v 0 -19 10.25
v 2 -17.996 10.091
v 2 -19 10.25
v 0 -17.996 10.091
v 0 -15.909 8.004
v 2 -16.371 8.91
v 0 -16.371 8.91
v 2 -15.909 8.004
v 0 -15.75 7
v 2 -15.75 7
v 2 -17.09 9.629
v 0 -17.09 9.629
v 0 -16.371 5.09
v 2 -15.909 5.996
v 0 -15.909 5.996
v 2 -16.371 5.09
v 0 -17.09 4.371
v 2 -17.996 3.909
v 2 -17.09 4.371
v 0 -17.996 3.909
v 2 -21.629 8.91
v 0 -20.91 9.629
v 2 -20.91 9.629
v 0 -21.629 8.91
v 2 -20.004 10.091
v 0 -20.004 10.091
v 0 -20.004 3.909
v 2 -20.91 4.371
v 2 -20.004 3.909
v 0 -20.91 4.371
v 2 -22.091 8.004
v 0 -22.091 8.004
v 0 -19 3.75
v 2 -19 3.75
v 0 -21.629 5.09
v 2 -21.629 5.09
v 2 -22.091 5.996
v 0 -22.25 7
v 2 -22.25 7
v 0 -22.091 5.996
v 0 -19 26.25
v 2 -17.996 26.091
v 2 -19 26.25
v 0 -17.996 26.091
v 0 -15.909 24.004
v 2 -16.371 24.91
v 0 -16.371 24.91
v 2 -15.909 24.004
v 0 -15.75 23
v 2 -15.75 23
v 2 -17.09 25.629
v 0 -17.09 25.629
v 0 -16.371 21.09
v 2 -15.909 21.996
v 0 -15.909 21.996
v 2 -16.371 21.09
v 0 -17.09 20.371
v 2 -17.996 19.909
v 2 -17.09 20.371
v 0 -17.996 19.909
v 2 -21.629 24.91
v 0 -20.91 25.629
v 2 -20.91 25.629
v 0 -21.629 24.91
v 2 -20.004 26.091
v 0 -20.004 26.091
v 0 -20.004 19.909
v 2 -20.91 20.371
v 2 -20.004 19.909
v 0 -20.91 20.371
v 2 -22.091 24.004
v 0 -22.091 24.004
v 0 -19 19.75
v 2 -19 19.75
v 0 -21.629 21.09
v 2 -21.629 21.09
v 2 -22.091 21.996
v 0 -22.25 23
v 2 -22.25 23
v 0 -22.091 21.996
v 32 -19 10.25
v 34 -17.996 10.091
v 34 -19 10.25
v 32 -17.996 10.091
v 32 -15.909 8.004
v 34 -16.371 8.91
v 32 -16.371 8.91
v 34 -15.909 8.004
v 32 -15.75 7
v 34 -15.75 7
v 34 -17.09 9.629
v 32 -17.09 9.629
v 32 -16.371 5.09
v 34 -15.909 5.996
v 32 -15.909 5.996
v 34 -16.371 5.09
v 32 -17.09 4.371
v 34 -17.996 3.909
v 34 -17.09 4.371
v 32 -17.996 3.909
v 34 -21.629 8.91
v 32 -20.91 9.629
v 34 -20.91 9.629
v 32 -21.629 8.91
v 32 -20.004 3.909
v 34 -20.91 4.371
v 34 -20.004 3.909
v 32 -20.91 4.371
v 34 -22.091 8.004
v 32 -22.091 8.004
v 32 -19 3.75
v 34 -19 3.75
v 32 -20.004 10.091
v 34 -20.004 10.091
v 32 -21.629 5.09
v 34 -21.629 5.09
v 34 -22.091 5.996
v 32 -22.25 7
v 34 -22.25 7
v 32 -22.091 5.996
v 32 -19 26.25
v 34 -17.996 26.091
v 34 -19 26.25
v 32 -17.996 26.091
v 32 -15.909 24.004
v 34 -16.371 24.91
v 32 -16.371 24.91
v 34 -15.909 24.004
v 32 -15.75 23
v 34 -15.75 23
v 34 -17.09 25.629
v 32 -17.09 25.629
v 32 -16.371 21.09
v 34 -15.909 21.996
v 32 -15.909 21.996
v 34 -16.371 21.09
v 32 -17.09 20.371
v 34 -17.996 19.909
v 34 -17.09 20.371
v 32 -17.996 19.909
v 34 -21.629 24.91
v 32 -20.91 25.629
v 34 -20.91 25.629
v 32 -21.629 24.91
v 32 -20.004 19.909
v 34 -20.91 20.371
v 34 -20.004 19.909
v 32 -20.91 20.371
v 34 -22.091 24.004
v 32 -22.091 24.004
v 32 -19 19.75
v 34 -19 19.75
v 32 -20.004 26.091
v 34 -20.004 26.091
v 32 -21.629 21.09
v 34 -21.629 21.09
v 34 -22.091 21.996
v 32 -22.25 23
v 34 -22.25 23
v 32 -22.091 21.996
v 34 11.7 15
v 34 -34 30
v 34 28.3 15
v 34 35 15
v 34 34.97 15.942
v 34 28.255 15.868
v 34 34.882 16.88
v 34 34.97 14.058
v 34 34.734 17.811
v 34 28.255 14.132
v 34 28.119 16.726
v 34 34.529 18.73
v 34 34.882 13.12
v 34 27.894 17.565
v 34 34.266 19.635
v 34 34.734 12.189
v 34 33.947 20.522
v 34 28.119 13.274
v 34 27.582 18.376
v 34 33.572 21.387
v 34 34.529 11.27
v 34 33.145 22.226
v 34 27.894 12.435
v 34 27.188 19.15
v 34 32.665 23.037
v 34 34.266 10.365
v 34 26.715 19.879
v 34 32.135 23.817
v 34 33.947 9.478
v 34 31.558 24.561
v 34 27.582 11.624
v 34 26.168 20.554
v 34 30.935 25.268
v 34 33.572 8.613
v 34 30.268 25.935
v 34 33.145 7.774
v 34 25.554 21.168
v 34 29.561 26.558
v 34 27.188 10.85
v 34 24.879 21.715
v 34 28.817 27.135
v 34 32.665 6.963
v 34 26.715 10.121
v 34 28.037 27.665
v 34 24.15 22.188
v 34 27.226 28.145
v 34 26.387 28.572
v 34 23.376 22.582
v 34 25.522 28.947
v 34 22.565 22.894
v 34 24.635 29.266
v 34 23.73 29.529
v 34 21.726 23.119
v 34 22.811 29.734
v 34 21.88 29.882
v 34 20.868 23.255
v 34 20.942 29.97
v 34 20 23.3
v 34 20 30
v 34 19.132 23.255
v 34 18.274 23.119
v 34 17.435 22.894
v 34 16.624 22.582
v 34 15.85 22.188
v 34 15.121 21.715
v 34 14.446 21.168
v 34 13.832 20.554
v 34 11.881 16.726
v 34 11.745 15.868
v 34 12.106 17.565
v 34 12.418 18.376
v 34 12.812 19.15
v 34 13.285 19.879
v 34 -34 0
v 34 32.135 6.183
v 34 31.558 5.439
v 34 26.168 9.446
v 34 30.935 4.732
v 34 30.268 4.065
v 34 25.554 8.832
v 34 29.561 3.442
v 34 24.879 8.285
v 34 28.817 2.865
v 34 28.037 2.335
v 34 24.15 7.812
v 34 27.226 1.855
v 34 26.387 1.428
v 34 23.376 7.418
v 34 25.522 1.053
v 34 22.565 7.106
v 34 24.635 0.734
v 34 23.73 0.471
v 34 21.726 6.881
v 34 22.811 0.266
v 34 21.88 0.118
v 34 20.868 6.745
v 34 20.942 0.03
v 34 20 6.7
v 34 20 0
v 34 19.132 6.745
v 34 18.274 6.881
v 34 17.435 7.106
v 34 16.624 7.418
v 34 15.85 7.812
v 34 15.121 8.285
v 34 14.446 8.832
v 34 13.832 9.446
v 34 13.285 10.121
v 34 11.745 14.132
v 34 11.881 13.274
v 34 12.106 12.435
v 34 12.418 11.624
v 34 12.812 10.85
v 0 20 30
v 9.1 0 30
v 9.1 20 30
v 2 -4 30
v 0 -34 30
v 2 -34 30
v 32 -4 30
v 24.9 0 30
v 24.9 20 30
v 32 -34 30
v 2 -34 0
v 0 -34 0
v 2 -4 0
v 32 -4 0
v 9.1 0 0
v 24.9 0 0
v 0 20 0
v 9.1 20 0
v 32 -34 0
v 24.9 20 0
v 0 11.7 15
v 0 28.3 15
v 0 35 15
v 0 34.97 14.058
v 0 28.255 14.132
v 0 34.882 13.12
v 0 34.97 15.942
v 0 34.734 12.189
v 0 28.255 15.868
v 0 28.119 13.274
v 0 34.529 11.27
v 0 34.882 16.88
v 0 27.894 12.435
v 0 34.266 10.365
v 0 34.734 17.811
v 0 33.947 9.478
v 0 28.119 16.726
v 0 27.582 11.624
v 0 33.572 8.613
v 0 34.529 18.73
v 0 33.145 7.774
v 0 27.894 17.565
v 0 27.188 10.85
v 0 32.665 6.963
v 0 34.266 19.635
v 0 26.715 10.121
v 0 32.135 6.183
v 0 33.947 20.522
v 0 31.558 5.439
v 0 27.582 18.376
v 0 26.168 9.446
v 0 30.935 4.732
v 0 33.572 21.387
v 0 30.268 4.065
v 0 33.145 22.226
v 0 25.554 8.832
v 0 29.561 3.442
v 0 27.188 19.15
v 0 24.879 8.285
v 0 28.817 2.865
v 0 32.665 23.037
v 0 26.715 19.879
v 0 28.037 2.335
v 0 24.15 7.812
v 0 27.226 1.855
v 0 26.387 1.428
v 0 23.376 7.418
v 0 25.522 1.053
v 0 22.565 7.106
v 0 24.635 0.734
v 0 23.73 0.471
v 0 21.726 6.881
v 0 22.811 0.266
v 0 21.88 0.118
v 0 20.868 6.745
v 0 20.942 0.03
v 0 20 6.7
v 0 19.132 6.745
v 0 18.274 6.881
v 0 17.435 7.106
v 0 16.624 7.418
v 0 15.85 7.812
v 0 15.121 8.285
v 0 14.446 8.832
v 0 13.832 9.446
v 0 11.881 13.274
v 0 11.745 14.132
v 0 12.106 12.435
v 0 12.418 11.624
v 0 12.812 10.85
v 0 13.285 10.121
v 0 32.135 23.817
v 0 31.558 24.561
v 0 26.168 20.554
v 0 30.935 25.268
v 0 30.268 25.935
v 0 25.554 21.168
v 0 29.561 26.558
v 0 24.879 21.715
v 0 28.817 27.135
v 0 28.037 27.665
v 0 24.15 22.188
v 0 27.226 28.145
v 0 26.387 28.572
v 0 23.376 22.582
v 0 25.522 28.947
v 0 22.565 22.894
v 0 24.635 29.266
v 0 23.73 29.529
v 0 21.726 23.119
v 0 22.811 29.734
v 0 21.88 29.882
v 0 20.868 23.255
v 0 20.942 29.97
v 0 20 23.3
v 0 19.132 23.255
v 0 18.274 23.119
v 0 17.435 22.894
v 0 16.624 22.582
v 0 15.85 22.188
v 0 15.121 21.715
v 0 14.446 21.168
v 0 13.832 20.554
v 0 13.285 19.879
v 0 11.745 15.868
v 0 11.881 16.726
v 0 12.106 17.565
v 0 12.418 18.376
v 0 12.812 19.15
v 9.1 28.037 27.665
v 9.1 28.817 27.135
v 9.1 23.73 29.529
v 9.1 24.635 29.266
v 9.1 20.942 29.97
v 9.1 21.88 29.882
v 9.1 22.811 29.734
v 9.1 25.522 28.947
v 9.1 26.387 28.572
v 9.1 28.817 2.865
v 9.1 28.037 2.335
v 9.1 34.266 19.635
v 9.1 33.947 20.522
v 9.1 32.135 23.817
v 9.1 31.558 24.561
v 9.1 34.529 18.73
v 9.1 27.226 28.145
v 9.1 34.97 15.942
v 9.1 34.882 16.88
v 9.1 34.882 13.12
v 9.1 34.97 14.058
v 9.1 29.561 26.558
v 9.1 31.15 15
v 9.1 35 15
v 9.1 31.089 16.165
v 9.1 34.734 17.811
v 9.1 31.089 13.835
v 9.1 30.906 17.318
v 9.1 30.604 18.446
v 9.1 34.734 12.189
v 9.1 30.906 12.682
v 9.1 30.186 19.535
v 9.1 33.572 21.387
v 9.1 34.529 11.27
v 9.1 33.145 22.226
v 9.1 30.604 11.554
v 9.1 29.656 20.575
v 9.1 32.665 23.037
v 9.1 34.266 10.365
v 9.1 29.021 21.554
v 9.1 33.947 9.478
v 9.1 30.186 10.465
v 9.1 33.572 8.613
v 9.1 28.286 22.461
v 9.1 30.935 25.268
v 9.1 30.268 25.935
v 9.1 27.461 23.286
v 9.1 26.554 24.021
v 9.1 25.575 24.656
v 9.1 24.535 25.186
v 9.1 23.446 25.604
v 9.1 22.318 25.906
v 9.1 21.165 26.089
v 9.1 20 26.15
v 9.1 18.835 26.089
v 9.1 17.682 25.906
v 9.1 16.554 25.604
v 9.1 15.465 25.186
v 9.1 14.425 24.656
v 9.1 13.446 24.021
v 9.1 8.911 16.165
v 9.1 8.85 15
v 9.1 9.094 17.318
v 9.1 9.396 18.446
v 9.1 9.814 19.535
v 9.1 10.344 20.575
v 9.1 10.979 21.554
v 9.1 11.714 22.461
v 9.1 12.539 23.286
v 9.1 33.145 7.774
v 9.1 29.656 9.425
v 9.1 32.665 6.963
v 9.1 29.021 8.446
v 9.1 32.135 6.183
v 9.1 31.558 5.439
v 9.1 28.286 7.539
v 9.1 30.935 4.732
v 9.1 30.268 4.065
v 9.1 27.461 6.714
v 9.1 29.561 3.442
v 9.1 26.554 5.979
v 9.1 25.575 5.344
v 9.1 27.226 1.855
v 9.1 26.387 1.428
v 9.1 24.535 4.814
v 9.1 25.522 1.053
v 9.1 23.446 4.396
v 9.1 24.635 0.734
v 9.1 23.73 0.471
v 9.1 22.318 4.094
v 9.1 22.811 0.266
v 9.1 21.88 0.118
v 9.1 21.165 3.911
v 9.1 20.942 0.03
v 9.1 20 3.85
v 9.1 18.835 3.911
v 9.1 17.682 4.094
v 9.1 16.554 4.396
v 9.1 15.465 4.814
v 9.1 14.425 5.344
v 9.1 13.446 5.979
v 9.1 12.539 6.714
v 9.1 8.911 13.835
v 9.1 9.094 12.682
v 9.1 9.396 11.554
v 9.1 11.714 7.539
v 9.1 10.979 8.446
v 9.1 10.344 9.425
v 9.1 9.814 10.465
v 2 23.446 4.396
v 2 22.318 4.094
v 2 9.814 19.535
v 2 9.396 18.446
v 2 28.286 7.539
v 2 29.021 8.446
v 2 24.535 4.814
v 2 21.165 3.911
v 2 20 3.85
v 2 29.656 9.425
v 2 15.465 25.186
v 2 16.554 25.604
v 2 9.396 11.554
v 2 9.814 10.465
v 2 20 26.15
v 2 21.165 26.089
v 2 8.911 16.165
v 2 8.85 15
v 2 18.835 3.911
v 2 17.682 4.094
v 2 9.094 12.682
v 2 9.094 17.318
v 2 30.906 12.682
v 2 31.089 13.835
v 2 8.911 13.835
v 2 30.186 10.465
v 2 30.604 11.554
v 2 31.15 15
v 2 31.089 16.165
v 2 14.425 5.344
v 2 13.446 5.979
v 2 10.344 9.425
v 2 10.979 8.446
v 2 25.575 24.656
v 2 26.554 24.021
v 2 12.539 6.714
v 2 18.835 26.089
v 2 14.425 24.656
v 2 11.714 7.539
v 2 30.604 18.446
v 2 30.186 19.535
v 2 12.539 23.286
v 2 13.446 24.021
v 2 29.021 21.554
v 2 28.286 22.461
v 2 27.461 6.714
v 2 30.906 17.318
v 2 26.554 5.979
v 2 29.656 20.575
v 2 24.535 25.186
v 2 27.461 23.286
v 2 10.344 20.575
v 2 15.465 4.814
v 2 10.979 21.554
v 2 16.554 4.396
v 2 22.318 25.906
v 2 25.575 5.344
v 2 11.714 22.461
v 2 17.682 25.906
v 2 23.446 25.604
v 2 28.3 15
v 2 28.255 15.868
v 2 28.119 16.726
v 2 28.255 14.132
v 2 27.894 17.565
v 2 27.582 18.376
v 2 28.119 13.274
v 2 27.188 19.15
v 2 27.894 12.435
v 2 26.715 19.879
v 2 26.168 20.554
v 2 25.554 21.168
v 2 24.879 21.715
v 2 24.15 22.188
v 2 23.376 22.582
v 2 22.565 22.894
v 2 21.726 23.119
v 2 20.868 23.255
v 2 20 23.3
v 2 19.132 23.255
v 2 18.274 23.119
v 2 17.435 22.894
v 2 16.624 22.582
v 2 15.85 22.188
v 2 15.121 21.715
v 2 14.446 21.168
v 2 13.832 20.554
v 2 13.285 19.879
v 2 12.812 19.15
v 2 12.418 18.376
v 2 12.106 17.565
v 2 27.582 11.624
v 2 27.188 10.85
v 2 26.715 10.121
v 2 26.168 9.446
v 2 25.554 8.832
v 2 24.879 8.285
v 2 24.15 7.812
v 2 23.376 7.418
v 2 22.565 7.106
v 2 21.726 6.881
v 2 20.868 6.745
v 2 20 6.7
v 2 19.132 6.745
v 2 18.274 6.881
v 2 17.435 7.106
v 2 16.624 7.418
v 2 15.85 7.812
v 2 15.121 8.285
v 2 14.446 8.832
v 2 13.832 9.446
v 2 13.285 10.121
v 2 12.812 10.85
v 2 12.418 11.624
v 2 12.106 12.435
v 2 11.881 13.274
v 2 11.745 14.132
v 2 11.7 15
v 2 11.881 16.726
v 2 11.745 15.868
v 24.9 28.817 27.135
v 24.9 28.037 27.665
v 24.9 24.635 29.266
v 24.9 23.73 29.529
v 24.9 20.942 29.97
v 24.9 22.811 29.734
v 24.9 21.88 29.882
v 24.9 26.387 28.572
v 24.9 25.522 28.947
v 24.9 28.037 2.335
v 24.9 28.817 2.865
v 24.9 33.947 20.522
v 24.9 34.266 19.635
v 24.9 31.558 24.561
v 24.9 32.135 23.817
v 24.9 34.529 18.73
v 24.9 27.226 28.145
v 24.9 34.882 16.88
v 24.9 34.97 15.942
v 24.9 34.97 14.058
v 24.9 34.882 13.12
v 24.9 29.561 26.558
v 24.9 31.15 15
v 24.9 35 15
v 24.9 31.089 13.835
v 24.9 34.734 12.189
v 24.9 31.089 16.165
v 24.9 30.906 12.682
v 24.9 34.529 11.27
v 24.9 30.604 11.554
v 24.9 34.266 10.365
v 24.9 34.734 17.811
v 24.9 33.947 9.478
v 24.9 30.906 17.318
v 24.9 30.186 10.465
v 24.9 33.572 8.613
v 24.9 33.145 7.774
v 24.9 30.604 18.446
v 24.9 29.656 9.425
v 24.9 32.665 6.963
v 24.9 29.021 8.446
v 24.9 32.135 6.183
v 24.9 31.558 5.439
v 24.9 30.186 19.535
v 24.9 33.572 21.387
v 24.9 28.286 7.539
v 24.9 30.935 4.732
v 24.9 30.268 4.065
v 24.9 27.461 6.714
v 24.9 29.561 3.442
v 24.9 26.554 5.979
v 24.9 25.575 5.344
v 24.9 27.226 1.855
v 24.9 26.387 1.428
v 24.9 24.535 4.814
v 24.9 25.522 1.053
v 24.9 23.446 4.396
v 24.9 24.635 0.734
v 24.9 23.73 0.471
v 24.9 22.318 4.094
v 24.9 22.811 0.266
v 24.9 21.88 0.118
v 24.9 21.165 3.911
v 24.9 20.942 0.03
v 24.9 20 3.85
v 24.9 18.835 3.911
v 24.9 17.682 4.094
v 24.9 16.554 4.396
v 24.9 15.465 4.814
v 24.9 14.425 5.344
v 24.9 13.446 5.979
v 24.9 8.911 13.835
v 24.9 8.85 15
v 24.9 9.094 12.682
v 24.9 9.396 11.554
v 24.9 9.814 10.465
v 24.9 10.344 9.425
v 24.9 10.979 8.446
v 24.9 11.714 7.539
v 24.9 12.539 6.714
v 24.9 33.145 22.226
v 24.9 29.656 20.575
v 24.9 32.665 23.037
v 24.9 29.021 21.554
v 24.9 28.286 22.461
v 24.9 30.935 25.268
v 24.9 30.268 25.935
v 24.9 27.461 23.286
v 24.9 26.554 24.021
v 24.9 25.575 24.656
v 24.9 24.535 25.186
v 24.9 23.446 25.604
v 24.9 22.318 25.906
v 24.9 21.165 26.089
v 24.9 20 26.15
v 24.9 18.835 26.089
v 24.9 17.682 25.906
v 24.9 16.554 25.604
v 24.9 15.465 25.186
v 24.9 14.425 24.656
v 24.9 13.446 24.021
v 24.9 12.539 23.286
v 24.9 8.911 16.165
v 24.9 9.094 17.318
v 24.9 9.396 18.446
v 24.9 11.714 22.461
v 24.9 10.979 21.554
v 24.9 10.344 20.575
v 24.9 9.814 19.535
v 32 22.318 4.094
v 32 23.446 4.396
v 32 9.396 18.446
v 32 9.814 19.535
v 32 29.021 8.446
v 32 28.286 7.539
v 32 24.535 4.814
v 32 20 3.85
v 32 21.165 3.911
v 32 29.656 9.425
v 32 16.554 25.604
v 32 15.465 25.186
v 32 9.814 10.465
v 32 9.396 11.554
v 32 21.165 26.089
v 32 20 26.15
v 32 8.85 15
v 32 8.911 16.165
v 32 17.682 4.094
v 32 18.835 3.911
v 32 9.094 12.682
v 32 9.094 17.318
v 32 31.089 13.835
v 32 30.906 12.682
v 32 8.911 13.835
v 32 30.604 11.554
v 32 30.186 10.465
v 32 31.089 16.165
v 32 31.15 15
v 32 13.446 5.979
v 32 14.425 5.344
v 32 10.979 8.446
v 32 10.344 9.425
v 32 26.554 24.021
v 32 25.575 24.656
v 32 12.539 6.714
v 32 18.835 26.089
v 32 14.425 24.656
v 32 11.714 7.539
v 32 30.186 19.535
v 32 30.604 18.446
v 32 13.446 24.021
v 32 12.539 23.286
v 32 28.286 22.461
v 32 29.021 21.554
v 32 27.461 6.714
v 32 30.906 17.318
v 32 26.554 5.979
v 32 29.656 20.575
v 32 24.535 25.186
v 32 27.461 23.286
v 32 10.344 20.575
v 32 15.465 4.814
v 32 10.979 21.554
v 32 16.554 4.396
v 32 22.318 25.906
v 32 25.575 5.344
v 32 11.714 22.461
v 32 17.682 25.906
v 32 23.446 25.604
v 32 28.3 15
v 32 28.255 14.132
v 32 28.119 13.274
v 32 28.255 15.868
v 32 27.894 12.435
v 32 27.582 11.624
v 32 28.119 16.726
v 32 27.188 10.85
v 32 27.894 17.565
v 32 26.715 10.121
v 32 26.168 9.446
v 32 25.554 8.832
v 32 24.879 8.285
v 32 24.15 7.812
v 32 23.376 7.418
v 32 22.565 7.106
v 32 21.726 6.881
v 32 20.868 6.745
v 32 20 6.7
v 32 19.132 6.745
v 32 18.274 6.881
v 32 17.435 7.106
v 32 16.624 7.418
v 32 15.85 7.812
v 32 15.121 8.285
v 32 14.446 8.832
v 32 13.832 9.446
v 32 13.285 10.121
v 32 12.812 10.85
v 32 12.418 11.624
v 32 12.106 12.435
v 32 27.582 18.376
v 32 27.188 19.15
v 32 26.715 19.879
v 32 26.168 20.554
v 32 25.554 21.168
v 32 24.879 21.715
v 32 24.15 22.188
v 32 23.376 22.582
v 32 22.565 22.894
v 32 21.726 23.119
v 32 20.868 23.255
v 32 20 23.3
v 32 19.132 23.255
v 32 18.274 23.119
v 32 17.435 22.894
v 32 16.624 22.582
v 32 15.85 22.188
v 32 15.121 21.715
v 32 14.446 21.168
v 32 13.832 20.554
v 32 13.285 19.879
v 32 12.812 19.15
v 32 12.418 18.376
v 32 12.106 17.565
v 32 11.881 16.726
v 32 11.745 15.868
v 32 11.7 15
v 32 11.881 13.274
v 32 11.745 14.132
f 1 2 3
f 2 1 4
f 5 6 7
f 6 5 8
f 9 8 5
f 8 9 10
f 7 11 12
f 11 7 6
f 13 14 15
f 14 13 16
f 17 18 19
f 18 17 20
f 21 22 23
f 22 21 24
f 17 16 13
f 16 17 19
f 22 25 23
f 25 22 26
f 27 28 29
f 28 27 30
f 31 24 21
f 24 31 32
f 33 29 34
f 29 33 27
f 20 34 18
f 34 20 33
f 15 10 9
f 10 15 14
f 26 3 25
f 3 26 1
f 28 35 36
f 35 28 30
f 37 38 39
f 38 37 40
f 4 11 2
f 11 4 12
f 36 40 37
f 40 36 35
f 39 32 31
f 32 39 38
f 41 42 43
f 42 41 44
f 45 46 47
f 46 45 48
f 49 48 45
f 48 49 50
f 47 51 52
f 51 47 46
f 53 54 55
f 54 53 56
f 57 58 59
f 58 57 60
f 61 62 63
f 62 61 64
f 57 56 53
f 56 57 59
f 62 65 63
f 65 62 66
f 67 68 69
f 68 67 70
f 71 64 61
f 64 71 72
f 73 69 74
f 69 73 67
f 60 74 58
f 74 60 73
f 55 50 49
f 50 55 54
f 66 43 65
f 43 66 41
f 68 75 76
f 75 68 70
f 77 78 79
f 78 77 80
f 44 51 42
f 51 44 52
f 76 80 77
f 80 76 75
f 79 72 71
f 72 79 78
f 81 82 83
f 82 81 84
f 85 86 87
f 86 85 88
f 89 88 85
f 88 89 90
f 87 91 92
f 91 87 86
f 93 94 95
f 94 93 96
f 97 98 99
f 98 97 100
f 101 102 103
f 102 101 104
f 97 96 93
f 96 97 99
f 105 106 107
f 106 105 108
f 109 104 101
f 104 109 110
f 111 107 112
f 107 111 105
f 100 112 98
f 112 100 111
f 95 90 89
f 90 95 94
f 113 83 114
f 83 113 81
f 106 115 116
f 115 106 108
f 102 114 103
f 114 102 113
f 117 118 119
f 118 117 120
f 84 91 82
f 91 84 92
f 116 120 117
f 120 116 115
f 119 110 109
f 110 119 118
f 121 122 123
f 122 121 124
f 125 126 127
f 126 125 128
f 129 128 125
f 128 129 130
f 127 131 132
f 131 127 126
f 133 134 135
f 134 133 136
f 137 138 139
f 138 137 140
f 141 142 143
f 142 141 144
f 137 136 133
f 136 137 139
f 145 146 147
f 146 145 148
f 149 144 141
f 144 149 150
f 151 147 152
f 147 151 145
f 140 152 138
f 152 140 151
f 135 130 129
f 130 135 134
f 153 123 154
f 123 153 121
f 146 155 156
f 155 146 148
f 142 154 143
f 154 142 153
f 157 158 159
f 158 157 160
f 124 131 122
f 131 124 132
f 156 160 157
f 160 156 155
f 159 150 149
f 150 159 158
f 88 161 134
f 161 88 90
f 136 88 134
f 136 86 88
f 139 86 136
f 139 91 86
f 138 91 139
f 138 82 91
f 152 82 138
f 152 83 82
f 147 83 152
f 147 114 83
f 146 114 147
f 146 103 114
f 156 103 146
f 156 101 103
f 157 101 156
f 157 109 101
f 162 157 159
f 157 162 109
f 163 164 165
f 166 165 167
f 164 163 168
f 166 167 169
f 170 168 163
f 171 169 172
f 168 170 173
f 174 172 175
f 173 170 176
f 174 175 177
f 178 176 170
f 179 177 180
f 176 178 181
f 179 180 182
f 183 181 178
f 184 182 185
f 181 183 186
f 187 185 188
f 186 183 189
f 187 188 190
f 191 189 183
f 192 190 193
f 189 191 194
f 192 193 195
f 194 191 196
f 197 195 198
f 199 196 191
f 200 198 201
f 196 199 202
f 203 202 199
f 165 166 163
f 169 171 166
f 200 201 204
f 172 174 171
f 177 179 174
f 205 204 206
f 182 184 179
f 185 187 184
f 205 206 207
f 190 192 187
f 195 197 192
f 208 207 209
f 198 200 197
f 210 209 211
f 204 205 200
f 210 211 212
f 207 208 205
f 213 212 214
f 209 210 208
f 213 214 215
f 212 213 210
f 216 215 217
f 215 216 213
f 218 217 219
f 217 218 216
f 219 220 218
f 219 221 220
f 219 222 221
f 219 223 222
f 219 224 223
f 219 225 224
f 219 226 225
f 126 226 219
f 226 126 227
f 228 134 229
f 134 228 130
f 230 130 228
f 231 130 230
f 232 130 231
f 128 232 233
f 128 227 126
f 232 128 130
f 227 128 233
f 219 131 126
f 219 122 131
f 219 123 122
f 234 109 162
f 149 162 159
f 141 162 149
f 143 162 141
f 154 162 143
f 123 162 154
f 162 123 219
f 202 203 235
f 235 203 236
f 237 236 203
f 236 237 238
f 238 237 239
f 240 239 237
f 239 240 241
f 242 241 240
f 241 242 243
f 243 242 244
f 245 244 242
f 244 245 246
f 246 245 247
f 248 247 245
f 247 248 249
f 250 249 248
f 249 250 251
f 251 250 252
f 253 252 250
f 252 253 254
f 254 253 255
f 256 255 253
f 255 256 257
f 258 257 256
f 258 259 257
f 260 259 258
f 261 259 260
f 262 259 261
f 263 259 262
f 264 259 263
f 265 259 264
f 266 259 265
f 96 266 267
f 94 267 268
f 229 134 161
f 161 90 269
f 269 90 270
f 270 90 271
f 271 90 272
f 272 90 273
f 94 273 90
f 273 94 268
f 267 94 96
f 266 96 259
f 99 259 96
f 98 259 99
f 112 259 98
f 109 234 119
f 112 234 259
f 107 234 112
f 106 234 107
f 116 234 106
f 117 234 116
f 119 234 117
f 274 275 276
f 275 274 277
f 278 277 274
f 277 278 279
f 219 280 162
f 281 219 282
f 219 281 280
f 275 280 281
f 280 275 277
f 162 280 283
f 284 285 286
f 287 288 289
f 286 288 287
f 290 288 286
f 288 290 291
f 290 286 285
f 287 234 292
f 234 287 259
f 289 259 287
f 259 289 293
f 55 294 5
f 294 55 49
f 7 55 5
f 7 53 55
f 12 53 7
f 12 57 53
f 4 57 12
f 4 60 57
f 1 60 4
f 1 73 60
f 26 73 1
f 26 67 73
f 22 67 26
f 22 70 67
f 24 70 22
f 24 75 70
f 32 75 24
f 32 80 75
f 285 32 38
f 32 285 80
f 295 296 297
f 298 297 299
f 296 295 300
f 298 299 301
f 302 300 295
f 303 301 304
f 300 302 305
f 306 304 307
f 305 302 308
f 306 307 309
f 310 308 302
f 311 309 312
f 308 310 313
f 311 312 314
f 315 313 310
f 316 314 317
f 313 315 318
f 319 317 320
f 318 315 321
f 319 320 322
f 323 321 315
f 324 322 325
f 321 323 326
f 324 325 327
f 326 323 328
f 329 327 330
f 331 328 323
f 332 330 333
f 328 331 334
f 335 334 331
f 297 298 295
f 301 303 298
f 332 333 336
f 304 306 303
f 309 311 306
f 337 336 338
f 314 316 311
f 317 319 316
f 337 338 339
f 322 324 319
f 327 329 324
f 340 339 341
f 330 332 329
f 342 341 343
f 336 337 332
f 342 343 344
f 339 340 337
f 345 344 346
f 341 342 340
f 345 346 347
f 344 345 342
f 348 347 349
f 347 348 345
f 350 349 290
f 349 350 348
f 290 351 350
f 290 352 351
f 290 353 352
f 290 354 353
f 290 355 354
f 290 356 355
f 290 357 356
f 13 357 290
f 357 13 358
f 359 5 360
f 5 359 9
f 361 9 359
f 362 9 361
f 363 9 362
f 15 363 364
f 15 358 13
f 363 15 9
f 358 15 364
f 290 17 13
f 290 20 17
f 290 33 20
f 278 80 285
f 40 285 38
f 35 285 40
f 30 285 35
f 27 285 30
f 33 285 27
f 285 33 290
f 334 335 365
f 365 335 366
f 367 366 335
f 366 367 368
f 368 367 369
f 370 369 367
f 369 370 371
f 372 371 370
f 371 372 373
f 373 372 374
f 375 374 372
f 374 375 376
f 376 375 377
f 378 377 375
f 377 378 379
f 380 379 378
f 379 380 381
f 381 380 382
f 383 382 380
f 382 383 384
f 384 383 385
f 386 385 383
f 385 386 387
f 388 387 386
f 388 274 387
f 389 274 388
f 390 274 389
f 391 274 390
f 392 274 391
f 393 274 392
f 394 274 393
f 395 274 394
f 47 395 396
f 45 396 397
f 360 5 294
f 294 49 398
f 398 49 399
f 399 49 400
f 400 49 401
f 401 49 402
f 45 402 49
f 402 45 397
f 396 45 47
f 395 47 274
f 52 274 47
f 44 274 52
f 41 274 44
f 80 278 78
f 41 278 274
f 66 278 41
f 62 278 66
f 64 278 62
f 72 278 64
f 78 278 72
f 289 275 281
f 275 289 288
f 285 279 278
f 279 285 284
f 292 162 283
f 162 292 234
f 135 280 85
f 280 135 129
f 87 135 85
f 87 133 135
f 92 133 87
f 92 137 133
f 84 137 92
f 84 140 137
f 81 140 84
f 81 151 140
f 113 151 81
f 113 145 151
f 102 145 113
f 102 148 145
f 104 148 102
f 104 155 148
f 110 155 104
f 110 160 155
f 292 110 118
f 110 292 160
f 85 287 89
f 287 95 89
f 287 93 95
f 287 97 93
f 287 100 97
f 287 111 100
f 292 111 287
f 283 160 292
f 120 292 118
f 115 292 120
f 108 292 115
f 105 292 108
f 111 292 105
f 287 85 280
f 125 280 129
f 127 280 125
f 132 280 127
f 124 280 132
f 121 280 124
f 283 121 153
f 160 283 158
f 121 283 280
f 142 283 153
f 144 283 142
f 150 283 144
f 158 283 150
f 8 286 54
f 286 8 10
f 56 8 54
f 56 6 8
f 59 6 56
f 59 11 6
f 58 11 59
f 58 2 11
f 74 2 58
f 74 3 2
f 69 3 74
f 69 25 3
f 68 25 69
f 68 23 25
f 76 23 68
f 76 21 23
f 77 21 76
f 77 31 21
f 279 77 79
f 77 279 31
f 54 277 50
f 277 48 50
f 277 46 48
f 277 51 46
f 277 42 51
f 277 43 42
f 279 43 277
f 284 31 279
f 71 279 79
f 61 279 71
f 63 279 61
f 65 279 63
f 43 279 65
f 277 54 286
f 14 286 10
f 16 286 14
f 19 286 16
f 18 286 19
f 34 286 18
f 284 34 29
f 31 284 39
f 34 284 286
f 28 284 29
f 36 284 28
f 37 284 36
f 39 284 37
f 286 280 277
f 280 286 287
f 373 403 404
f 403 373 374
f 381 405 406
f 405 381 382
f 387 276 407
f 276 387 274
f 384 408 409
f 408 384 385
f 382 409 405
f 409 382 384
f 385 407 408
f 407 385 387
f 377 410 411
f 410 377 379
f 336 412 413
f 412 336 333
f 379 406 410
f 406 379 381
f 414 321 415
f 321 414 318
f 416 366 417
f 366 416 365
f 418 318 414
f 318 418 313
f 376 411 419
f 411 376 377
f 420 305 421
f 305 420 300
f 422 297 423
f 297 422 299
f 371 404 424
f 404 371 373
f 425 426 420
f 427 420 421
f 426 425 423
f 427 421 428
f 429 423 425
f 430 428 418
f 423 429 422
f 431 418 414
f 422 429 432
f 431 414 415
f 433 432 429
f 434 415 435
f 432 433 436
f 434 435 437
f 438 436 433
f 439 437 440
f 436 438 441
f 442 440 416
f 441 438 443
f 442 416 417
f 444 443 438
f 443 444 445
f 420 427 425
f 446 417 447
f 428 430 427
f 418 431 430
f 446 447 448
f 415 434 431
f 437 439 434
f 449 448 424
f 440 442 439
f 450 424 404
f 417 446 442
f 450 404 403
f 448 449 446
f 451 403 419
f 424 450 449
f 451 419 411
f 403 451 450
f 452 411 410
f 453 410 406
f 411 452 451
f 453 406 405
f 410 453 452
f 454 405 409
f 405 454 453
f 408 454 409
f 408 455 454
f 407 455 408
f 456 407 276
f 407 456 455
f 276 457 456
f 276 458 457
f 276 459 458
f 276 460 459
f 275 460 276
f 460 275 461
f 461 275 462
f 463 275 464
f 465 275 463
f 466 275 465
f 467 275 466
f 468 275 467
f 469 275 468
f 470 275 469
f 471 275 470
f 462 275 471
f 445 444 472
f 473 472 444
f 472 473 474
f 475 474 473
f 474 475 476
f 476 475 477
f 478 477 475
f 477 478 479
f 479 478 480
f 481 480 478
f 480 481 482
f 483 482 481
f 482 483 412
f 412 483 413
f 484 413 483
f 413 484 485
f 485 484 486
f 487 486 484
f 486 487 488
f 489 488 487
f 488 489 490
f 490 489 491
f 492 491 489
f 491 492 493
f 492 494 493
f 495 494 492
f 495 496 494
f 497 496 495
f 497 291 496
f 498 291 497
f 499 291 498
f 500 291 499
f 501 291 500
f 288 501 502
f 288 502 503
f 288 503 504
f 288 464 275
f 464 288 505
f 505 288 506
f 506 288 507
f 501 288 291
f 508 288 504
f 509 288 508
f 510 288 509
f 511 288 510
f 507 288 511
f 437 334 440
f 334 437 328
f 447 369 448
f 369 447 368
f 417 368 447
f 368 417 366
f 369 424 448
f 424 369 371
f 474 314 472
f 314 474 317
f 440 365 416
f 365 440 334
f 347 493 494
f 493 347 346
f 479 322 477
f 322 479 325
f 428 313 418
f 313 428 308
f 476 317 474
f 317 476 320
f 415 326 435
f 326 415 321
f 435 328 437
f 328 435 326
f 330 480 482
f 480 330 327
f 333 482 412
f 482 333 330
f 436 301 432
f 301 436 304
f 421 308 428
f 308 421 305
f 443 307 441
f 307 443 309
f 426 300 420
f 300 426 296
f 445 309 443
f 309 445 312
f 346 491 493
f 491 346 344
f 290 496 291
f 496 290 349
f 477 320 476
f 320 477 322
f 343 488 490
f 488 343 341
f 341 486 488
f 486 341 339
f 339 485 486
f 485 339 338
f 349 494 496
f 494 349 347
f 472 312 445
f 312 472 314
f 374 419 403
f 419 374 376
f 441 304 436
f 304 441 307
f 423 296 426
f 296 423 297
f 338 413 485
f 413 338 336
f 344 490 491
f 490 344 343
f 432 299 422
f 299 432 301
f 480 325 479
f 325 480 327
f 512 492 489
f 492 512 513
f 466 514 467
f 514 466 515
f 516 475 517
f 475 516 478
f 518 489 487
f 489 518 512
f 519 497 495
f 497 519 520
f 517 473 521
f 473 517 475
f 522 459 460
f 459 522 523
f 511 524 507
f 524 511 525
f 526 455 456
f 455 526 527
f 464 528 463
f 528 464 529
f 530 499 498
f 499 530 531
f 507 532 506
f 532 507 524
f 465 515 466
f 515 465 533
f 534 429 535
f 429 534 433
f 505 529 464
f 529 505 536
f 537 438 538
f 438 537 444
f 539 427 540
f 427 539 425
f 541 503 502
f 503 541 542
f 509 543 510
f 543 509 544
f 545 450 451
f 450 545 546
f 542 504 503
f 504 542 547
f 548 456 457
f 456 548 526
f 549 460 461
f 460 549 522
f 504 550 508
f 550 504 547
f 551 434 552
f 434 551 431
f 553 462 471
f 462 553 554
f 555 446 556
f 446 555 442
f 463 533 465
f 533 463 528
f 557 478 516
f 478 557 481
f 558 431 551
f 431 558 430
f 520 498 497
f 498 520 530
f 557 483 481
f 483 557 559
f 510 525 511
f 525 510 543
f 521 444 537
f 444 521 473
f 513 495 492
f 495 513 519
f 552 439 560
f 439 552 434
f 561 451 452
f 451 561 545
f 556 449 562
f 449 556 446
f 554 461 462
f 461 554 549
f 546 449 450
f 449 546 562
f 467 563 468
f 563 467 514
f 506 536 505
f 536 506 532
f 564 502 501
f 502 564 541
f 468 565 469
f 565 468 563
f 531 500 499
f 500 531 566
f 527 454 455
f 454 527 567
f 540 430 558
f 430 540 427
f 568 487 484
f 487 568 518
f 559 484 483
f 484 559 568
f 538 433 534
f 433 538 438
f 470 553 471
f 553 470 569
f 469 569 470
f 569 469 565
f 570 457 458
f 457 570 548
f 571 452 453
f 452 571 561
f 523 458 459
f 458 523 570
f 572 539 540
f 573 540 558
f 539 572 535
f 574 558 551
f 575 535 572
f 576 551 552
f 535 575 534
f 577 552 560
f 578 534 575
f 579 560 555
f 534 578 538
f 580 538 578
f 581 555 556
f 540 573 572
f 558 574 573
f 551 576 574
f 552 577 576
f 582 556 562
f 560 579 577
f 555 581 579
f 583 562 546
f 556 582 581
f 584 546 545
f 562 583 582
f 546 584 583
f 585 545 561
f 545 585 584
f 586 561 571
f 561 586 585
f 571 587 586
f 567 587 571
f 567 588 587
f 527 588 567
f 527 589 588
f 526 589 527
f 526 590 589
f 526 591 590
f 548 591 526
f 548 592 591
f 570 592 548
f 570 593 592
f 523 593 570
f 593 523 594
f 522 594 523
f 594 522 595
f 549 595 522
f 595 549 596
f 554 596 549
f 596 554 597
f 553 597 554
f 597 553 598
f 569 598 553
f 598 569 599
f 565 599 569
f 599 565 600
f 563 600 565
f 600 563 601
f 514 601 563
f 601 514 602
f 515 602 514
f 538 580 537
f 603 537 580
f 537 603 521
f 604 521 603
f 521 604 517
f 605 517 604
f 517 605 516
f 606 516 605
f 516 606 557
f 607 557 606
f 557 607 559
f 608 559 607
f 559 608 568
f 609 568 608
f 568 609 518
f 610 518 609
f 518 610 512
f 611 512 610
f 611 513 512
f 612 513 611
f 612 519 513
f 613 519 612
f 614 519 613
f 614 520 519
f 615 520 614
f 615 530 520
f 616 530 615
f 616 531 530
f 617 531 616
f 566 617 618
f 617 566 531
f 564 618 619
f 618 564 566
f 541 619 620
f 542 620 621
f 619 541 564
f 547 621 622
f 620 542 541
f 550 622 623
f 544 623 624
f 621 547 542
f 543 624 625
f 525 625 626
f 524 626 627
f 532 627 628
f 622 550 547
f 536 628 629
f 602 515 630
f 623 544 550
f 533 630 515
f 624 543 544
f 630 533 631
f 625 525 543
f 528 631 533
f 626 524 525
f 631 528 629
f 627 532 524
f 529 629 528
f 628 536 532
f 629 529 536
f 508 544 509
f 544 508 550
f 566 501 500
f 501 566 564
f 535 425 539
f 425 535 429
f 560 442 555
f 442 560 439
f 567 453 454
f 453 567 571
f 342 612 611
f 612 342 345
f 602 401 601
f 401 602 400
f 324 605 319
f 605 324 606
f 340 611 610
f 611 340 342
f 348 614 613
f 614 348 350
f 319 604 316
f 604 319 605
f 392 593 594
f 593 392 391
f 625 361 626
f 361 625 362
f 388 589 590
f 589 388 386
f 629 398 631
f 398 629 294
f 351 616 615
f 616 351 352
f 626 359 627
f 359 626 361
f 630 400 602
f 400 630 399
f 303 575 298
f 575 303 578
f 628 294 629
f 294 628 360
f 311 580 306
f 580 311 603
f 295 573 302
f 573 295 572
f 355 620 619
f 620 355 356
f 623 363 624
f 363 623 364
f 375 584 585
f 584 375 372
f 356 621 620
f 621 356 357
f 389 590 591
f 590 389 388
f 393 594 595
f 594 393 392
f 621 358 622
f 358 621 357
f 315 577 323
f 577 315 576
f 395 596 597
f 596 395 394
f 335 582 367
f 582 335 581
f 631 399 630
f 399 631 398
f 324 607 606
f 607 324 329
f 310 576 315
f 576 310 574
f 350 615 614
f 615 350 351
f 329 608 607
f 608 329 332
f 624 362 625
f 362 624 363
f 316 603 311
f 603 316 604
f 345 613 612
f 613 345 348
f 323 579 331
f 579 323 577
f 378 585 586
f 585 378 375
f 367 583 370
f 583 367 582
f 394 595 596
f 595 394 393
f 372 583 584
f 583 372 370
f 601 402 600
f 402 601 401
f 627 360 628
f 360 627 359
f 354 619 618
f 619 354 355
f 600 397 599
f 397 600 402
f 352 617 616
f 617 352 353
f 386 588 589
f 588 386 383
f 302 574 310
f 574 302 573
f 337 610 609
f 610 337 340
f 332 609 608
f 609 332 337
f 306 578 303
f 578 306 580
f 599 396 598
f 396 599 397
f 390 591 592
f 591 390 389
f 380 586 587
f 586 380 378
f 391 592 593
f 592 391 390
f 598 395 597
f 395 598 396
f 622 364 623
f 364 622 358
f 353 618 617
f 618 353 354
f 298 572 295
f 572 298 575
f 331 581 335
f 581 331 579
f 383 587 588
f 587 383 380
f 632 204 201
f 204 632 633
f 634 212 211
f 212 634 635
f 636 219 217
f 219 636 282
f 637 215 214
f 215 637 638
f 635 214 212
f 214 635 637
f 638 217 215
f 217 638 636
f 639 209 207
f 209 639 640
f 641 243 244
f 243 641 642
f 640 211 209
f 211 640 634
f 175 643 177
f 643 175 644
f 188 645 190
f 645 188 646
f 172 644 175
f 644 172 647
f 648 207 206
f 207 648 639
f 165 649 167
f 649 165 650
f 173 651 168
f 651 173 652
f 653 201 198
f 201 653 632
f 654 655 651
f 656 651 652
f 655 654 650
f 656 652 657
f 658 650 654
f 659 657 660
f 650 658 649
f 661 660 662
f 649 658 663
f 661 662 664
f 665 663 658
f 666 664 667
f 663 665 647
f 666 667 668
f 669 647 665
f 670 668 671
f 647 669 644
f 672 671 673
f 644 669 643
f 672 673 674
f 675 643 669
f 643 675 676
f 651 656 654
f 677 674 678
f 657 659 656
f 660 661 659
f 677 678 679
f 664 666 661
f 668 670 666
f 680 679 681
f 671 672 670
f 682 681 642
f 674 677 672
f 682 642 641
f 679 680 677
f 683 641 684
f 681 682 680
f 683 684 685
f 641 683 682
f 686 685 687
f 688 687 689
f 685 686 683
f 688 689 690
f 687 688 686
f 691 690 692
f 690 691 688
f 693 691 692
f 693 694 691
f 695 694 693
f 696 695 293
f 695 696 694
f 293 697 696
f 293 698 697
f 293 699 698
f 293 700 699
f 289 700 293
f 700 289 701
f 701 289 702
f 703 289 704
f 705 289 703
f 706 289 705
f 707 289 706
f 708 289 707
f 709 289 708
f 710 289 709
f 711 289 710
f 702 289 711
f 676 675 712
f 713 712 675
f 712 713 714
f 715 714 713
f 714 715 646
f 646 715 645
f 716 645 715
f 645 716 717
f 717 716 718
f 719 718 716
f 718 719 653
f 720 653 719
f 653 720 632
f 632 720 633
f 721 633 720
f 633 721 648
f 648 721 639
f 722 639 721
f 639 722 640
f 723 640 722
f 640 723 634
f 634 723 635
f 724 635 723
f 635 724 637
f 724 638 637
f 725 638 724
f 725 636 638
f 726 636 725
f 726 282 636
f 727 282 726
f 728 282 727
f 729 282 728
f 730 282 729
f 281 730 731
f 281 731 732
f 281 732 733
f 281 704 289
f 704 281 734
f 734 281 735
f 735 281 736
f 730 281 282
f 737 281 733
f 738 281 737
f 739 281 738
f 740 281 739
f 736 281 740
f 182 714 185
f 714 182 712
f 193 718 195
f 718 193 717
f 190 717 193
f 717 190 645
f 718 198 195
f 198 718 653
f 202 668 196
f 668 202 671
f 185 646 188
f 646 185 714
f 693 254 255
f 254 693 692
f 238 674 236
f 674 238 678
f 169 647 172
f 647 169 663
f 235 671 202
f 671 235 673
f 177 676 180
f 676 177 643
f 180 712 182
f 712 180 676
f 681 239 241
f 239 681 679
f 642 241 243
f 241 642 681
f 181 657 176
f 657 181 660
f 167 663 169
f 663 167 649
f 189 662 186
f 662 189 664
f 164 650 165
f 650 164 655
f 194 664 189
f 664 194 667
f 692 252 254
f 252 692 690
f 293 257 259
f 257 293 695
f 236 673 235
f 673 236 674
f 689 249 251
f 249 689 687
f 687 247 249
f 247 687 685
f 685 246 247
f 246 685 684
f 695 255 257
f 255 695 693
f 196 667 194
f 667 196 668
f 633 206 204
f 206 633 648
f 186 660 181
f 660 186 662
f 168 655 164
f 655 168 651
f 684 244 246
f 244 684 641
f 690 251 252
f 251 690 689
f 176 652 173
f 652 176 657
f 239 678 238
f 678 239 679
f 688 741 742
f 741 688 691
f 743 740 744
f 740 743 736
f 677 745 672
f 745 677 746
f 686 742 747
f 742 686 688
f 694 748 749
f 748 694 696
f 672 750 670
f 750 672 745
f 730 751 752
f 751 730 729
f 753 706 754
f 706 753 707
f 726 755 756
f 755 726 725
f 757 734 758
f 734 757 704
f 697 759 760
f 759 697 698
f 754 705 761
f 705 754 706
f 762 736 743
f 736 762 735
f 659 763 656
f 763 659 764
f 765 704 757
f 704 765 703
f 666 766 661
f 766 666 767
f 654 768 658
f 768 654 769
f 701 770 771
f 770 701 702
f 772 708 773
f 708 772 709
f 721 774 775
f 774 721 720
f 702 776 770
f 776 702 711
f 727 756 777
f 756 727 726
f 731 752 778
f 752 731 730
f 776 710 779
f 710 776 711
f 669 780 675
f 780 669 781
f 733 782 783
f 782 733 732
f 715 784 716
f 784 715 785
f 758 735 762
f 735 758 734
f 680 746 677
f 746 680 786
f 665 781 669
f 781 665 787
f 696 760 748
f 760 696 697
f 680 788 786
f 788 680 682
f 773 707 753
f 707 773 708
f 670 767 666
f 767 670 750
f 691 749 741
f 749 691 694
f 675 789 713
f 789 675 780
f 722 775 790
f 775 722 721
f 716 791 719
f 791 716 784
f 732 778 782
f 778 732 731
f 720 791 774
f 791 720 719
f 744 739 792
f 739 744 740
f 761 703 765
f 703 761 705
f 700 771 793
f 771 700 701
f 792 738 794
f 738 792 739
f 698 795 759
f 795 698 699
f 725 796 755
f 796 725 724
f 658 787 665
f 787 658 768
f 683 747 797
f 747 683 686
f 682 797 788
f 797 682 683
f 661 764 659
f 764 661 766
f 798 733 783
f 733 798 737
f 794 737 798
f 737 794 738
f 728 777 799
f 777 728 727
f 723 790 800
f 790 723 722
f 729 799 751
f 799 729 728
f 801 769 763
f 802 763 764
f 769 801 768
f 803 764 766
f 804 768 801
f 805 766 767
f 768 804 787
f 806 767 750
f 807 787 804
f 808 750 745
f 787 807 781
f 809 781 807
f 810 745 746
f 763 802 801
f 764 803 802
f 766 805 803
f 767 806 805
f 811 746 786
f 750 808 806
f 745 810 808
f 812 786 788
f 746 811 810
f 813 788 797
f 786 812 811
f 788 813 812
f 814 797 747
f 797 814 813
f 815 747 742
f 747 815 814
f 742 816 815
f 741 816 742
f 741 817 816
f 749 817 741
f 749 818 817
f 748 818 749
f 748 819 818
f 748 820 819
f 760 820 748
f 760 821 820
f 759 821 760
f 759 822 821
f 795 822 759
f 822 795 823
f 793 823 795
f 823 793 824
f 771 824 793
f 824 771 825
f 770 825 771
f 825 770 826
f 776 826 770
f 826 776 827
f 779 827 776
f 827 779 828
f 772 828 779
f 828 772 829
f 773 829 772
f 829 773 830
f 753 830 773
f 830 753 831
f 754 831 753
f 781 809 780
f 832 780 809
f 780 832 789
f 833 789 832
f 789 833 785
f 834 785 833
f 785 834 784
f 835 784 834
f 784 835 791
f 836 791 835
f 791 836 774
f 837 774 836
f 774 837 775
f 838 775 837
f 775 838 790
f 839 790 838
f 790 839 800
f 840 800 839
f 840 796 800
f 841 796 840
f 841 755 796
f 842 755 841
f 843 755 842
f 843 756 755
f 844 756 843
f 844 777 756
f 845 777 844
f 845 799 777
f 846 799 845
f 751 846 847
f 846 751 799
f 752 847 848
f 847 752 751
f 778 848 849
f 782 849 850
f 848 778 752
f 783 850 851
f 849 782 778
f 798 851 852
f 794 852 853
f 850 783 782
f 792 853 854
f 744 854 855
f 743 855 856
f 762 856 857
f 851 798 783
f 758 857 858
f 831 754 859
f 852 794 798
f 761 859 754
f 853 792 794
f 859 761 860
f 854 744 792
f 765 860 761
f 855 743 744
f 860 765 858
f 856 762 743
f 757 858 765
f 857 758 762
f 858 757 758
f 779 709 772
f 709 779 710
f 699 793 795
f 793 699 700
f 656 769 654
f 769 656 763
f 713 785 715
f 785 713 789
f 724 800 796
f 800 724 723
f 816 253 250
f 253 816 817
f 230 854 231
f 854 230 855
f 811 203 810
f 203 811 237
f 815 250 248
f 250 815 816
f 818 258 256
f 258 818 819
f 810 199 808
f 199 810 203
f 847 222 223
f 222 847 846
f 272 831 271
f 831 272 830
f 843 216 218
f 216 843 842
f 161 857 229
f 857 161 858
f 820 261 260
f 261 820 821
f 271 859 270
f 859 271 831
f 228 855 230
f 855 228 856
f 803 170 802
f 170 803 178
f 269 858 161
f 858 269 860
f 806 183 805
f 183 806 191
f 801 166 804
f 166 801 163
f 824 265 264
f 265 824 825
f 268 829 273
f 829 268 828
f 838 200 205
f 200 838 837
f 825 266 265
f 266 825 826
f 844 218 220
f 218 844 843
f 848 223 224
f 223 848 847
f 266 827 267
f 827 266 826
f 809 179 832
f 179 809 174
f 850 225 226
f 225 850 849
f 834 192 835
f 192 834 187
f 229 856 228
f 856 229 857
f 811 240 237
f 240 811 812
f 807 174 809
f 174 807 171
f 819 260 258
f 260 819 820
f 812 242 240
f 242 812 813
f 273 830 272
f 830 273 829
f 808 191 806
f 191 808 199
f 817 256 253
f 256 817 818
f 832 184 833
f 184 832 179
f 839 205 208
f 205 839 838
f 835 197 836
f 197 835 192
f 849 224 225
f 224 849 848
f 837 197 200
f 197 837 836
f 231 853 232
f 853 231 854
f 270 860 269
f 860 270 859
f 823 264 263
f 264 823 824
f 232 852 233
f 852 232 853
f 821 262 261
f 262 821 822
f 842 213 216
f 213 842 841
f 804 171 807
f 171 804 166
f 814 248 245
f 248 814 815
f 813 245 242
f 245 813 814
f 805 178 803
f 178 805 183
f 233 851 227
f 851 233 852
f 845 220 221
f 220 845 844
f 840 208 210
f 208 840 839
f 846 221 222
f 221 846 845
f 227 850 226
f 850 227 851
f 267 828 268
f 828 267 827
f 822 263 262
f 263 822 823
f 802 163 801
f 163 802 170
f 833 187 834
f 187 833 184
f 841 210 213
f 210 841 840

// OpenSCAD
// file: ../lib/ALU_profile_holder_side.scad
include <../../parameters.scad>



module ALU_profile_holder_side() {
    wall_thickness = ALU_profile_holder_wall_thickness;
    
    //díry na přišroubování k Al profilům
    module screws_holes(diameter) {
        translate([0, 0, 7])
            rotate([90, 0, 90])
                cylinder(d=diameter, h=wall_thickness*2, center=true, $fn=20);
        
        translate([0, 0, strain_gauge_screw_distance+13])
            rotate([90, 0, 90])
                cylinder(d=diameter, h=wall_thickness*2, center=true, $fn=20);
    }
    
    difference() {
        cube([ALU_profile_width+wall_thickness*2, ALU_profile_width+wall_thickness*2, strain_gauge_screw_distance+20]);

        translate([wall_thickness, 0, 0])
        cube([ALU_profile_width, ALU_profile_width, strain_gauge_screw_distance+20]);
        
        translate([wall_thickness*0.5, ALU_profile_width/2, 0]) {
                screws_holes(M6_screw_diameter);
                translate([ALU_profile_width+wall_thickness, 0, 0]) {
                    screws_holes(M6_screw_diameter);
                }
        }
    }
}

ALU_profile_holder_side();
// main file
include <../../parameters.scad>
use <../lib/ALU_profile_holder_side.scad>

module 888_5003() {
    translate([0, -ALU_profile_width-ALU_profile_holder_wall_thickness*2, 0])
        ALU_profile_holder_side();
    
    module bearing_holder() {
        difference() {
            hull() {
                cube([608_bearing_thickness+2, 10, strain_gauge_screw_distance+20]);
                translate([0, 20, (strain_gauge_screw_distance+20)/2])
                    rotate([0, 90, 0])
                        cylinder(d=strain_gauge_screw_distance+20, h=608_bearing_thickness+2, $fn=100);
            }
            
            translate([2, 20, (strain_gauge_screw_distance+20)/2])
                    rotate([0, 90, 0])
                        cylinder(d=608_bearing_outer_diameter, h=608_bearing_thickness+0.1, $fn=60);
            
            translate([-0.1, 20, (strain_gauge_screw_distance+20)/2])
                    rotate([0, 90, 0])
                        cylinder(d=M8_screw_diameter+8, h=608_bearing_thickness+2, $fn=60);
        }
    }
    
    bearing_holder();
    translate([ALU_profile_width+ALU_profile_holder_wall_thickness*2, 0, 0])
    mirror([1, 0, 0])
        bearing_holder();
}

888_5003();
